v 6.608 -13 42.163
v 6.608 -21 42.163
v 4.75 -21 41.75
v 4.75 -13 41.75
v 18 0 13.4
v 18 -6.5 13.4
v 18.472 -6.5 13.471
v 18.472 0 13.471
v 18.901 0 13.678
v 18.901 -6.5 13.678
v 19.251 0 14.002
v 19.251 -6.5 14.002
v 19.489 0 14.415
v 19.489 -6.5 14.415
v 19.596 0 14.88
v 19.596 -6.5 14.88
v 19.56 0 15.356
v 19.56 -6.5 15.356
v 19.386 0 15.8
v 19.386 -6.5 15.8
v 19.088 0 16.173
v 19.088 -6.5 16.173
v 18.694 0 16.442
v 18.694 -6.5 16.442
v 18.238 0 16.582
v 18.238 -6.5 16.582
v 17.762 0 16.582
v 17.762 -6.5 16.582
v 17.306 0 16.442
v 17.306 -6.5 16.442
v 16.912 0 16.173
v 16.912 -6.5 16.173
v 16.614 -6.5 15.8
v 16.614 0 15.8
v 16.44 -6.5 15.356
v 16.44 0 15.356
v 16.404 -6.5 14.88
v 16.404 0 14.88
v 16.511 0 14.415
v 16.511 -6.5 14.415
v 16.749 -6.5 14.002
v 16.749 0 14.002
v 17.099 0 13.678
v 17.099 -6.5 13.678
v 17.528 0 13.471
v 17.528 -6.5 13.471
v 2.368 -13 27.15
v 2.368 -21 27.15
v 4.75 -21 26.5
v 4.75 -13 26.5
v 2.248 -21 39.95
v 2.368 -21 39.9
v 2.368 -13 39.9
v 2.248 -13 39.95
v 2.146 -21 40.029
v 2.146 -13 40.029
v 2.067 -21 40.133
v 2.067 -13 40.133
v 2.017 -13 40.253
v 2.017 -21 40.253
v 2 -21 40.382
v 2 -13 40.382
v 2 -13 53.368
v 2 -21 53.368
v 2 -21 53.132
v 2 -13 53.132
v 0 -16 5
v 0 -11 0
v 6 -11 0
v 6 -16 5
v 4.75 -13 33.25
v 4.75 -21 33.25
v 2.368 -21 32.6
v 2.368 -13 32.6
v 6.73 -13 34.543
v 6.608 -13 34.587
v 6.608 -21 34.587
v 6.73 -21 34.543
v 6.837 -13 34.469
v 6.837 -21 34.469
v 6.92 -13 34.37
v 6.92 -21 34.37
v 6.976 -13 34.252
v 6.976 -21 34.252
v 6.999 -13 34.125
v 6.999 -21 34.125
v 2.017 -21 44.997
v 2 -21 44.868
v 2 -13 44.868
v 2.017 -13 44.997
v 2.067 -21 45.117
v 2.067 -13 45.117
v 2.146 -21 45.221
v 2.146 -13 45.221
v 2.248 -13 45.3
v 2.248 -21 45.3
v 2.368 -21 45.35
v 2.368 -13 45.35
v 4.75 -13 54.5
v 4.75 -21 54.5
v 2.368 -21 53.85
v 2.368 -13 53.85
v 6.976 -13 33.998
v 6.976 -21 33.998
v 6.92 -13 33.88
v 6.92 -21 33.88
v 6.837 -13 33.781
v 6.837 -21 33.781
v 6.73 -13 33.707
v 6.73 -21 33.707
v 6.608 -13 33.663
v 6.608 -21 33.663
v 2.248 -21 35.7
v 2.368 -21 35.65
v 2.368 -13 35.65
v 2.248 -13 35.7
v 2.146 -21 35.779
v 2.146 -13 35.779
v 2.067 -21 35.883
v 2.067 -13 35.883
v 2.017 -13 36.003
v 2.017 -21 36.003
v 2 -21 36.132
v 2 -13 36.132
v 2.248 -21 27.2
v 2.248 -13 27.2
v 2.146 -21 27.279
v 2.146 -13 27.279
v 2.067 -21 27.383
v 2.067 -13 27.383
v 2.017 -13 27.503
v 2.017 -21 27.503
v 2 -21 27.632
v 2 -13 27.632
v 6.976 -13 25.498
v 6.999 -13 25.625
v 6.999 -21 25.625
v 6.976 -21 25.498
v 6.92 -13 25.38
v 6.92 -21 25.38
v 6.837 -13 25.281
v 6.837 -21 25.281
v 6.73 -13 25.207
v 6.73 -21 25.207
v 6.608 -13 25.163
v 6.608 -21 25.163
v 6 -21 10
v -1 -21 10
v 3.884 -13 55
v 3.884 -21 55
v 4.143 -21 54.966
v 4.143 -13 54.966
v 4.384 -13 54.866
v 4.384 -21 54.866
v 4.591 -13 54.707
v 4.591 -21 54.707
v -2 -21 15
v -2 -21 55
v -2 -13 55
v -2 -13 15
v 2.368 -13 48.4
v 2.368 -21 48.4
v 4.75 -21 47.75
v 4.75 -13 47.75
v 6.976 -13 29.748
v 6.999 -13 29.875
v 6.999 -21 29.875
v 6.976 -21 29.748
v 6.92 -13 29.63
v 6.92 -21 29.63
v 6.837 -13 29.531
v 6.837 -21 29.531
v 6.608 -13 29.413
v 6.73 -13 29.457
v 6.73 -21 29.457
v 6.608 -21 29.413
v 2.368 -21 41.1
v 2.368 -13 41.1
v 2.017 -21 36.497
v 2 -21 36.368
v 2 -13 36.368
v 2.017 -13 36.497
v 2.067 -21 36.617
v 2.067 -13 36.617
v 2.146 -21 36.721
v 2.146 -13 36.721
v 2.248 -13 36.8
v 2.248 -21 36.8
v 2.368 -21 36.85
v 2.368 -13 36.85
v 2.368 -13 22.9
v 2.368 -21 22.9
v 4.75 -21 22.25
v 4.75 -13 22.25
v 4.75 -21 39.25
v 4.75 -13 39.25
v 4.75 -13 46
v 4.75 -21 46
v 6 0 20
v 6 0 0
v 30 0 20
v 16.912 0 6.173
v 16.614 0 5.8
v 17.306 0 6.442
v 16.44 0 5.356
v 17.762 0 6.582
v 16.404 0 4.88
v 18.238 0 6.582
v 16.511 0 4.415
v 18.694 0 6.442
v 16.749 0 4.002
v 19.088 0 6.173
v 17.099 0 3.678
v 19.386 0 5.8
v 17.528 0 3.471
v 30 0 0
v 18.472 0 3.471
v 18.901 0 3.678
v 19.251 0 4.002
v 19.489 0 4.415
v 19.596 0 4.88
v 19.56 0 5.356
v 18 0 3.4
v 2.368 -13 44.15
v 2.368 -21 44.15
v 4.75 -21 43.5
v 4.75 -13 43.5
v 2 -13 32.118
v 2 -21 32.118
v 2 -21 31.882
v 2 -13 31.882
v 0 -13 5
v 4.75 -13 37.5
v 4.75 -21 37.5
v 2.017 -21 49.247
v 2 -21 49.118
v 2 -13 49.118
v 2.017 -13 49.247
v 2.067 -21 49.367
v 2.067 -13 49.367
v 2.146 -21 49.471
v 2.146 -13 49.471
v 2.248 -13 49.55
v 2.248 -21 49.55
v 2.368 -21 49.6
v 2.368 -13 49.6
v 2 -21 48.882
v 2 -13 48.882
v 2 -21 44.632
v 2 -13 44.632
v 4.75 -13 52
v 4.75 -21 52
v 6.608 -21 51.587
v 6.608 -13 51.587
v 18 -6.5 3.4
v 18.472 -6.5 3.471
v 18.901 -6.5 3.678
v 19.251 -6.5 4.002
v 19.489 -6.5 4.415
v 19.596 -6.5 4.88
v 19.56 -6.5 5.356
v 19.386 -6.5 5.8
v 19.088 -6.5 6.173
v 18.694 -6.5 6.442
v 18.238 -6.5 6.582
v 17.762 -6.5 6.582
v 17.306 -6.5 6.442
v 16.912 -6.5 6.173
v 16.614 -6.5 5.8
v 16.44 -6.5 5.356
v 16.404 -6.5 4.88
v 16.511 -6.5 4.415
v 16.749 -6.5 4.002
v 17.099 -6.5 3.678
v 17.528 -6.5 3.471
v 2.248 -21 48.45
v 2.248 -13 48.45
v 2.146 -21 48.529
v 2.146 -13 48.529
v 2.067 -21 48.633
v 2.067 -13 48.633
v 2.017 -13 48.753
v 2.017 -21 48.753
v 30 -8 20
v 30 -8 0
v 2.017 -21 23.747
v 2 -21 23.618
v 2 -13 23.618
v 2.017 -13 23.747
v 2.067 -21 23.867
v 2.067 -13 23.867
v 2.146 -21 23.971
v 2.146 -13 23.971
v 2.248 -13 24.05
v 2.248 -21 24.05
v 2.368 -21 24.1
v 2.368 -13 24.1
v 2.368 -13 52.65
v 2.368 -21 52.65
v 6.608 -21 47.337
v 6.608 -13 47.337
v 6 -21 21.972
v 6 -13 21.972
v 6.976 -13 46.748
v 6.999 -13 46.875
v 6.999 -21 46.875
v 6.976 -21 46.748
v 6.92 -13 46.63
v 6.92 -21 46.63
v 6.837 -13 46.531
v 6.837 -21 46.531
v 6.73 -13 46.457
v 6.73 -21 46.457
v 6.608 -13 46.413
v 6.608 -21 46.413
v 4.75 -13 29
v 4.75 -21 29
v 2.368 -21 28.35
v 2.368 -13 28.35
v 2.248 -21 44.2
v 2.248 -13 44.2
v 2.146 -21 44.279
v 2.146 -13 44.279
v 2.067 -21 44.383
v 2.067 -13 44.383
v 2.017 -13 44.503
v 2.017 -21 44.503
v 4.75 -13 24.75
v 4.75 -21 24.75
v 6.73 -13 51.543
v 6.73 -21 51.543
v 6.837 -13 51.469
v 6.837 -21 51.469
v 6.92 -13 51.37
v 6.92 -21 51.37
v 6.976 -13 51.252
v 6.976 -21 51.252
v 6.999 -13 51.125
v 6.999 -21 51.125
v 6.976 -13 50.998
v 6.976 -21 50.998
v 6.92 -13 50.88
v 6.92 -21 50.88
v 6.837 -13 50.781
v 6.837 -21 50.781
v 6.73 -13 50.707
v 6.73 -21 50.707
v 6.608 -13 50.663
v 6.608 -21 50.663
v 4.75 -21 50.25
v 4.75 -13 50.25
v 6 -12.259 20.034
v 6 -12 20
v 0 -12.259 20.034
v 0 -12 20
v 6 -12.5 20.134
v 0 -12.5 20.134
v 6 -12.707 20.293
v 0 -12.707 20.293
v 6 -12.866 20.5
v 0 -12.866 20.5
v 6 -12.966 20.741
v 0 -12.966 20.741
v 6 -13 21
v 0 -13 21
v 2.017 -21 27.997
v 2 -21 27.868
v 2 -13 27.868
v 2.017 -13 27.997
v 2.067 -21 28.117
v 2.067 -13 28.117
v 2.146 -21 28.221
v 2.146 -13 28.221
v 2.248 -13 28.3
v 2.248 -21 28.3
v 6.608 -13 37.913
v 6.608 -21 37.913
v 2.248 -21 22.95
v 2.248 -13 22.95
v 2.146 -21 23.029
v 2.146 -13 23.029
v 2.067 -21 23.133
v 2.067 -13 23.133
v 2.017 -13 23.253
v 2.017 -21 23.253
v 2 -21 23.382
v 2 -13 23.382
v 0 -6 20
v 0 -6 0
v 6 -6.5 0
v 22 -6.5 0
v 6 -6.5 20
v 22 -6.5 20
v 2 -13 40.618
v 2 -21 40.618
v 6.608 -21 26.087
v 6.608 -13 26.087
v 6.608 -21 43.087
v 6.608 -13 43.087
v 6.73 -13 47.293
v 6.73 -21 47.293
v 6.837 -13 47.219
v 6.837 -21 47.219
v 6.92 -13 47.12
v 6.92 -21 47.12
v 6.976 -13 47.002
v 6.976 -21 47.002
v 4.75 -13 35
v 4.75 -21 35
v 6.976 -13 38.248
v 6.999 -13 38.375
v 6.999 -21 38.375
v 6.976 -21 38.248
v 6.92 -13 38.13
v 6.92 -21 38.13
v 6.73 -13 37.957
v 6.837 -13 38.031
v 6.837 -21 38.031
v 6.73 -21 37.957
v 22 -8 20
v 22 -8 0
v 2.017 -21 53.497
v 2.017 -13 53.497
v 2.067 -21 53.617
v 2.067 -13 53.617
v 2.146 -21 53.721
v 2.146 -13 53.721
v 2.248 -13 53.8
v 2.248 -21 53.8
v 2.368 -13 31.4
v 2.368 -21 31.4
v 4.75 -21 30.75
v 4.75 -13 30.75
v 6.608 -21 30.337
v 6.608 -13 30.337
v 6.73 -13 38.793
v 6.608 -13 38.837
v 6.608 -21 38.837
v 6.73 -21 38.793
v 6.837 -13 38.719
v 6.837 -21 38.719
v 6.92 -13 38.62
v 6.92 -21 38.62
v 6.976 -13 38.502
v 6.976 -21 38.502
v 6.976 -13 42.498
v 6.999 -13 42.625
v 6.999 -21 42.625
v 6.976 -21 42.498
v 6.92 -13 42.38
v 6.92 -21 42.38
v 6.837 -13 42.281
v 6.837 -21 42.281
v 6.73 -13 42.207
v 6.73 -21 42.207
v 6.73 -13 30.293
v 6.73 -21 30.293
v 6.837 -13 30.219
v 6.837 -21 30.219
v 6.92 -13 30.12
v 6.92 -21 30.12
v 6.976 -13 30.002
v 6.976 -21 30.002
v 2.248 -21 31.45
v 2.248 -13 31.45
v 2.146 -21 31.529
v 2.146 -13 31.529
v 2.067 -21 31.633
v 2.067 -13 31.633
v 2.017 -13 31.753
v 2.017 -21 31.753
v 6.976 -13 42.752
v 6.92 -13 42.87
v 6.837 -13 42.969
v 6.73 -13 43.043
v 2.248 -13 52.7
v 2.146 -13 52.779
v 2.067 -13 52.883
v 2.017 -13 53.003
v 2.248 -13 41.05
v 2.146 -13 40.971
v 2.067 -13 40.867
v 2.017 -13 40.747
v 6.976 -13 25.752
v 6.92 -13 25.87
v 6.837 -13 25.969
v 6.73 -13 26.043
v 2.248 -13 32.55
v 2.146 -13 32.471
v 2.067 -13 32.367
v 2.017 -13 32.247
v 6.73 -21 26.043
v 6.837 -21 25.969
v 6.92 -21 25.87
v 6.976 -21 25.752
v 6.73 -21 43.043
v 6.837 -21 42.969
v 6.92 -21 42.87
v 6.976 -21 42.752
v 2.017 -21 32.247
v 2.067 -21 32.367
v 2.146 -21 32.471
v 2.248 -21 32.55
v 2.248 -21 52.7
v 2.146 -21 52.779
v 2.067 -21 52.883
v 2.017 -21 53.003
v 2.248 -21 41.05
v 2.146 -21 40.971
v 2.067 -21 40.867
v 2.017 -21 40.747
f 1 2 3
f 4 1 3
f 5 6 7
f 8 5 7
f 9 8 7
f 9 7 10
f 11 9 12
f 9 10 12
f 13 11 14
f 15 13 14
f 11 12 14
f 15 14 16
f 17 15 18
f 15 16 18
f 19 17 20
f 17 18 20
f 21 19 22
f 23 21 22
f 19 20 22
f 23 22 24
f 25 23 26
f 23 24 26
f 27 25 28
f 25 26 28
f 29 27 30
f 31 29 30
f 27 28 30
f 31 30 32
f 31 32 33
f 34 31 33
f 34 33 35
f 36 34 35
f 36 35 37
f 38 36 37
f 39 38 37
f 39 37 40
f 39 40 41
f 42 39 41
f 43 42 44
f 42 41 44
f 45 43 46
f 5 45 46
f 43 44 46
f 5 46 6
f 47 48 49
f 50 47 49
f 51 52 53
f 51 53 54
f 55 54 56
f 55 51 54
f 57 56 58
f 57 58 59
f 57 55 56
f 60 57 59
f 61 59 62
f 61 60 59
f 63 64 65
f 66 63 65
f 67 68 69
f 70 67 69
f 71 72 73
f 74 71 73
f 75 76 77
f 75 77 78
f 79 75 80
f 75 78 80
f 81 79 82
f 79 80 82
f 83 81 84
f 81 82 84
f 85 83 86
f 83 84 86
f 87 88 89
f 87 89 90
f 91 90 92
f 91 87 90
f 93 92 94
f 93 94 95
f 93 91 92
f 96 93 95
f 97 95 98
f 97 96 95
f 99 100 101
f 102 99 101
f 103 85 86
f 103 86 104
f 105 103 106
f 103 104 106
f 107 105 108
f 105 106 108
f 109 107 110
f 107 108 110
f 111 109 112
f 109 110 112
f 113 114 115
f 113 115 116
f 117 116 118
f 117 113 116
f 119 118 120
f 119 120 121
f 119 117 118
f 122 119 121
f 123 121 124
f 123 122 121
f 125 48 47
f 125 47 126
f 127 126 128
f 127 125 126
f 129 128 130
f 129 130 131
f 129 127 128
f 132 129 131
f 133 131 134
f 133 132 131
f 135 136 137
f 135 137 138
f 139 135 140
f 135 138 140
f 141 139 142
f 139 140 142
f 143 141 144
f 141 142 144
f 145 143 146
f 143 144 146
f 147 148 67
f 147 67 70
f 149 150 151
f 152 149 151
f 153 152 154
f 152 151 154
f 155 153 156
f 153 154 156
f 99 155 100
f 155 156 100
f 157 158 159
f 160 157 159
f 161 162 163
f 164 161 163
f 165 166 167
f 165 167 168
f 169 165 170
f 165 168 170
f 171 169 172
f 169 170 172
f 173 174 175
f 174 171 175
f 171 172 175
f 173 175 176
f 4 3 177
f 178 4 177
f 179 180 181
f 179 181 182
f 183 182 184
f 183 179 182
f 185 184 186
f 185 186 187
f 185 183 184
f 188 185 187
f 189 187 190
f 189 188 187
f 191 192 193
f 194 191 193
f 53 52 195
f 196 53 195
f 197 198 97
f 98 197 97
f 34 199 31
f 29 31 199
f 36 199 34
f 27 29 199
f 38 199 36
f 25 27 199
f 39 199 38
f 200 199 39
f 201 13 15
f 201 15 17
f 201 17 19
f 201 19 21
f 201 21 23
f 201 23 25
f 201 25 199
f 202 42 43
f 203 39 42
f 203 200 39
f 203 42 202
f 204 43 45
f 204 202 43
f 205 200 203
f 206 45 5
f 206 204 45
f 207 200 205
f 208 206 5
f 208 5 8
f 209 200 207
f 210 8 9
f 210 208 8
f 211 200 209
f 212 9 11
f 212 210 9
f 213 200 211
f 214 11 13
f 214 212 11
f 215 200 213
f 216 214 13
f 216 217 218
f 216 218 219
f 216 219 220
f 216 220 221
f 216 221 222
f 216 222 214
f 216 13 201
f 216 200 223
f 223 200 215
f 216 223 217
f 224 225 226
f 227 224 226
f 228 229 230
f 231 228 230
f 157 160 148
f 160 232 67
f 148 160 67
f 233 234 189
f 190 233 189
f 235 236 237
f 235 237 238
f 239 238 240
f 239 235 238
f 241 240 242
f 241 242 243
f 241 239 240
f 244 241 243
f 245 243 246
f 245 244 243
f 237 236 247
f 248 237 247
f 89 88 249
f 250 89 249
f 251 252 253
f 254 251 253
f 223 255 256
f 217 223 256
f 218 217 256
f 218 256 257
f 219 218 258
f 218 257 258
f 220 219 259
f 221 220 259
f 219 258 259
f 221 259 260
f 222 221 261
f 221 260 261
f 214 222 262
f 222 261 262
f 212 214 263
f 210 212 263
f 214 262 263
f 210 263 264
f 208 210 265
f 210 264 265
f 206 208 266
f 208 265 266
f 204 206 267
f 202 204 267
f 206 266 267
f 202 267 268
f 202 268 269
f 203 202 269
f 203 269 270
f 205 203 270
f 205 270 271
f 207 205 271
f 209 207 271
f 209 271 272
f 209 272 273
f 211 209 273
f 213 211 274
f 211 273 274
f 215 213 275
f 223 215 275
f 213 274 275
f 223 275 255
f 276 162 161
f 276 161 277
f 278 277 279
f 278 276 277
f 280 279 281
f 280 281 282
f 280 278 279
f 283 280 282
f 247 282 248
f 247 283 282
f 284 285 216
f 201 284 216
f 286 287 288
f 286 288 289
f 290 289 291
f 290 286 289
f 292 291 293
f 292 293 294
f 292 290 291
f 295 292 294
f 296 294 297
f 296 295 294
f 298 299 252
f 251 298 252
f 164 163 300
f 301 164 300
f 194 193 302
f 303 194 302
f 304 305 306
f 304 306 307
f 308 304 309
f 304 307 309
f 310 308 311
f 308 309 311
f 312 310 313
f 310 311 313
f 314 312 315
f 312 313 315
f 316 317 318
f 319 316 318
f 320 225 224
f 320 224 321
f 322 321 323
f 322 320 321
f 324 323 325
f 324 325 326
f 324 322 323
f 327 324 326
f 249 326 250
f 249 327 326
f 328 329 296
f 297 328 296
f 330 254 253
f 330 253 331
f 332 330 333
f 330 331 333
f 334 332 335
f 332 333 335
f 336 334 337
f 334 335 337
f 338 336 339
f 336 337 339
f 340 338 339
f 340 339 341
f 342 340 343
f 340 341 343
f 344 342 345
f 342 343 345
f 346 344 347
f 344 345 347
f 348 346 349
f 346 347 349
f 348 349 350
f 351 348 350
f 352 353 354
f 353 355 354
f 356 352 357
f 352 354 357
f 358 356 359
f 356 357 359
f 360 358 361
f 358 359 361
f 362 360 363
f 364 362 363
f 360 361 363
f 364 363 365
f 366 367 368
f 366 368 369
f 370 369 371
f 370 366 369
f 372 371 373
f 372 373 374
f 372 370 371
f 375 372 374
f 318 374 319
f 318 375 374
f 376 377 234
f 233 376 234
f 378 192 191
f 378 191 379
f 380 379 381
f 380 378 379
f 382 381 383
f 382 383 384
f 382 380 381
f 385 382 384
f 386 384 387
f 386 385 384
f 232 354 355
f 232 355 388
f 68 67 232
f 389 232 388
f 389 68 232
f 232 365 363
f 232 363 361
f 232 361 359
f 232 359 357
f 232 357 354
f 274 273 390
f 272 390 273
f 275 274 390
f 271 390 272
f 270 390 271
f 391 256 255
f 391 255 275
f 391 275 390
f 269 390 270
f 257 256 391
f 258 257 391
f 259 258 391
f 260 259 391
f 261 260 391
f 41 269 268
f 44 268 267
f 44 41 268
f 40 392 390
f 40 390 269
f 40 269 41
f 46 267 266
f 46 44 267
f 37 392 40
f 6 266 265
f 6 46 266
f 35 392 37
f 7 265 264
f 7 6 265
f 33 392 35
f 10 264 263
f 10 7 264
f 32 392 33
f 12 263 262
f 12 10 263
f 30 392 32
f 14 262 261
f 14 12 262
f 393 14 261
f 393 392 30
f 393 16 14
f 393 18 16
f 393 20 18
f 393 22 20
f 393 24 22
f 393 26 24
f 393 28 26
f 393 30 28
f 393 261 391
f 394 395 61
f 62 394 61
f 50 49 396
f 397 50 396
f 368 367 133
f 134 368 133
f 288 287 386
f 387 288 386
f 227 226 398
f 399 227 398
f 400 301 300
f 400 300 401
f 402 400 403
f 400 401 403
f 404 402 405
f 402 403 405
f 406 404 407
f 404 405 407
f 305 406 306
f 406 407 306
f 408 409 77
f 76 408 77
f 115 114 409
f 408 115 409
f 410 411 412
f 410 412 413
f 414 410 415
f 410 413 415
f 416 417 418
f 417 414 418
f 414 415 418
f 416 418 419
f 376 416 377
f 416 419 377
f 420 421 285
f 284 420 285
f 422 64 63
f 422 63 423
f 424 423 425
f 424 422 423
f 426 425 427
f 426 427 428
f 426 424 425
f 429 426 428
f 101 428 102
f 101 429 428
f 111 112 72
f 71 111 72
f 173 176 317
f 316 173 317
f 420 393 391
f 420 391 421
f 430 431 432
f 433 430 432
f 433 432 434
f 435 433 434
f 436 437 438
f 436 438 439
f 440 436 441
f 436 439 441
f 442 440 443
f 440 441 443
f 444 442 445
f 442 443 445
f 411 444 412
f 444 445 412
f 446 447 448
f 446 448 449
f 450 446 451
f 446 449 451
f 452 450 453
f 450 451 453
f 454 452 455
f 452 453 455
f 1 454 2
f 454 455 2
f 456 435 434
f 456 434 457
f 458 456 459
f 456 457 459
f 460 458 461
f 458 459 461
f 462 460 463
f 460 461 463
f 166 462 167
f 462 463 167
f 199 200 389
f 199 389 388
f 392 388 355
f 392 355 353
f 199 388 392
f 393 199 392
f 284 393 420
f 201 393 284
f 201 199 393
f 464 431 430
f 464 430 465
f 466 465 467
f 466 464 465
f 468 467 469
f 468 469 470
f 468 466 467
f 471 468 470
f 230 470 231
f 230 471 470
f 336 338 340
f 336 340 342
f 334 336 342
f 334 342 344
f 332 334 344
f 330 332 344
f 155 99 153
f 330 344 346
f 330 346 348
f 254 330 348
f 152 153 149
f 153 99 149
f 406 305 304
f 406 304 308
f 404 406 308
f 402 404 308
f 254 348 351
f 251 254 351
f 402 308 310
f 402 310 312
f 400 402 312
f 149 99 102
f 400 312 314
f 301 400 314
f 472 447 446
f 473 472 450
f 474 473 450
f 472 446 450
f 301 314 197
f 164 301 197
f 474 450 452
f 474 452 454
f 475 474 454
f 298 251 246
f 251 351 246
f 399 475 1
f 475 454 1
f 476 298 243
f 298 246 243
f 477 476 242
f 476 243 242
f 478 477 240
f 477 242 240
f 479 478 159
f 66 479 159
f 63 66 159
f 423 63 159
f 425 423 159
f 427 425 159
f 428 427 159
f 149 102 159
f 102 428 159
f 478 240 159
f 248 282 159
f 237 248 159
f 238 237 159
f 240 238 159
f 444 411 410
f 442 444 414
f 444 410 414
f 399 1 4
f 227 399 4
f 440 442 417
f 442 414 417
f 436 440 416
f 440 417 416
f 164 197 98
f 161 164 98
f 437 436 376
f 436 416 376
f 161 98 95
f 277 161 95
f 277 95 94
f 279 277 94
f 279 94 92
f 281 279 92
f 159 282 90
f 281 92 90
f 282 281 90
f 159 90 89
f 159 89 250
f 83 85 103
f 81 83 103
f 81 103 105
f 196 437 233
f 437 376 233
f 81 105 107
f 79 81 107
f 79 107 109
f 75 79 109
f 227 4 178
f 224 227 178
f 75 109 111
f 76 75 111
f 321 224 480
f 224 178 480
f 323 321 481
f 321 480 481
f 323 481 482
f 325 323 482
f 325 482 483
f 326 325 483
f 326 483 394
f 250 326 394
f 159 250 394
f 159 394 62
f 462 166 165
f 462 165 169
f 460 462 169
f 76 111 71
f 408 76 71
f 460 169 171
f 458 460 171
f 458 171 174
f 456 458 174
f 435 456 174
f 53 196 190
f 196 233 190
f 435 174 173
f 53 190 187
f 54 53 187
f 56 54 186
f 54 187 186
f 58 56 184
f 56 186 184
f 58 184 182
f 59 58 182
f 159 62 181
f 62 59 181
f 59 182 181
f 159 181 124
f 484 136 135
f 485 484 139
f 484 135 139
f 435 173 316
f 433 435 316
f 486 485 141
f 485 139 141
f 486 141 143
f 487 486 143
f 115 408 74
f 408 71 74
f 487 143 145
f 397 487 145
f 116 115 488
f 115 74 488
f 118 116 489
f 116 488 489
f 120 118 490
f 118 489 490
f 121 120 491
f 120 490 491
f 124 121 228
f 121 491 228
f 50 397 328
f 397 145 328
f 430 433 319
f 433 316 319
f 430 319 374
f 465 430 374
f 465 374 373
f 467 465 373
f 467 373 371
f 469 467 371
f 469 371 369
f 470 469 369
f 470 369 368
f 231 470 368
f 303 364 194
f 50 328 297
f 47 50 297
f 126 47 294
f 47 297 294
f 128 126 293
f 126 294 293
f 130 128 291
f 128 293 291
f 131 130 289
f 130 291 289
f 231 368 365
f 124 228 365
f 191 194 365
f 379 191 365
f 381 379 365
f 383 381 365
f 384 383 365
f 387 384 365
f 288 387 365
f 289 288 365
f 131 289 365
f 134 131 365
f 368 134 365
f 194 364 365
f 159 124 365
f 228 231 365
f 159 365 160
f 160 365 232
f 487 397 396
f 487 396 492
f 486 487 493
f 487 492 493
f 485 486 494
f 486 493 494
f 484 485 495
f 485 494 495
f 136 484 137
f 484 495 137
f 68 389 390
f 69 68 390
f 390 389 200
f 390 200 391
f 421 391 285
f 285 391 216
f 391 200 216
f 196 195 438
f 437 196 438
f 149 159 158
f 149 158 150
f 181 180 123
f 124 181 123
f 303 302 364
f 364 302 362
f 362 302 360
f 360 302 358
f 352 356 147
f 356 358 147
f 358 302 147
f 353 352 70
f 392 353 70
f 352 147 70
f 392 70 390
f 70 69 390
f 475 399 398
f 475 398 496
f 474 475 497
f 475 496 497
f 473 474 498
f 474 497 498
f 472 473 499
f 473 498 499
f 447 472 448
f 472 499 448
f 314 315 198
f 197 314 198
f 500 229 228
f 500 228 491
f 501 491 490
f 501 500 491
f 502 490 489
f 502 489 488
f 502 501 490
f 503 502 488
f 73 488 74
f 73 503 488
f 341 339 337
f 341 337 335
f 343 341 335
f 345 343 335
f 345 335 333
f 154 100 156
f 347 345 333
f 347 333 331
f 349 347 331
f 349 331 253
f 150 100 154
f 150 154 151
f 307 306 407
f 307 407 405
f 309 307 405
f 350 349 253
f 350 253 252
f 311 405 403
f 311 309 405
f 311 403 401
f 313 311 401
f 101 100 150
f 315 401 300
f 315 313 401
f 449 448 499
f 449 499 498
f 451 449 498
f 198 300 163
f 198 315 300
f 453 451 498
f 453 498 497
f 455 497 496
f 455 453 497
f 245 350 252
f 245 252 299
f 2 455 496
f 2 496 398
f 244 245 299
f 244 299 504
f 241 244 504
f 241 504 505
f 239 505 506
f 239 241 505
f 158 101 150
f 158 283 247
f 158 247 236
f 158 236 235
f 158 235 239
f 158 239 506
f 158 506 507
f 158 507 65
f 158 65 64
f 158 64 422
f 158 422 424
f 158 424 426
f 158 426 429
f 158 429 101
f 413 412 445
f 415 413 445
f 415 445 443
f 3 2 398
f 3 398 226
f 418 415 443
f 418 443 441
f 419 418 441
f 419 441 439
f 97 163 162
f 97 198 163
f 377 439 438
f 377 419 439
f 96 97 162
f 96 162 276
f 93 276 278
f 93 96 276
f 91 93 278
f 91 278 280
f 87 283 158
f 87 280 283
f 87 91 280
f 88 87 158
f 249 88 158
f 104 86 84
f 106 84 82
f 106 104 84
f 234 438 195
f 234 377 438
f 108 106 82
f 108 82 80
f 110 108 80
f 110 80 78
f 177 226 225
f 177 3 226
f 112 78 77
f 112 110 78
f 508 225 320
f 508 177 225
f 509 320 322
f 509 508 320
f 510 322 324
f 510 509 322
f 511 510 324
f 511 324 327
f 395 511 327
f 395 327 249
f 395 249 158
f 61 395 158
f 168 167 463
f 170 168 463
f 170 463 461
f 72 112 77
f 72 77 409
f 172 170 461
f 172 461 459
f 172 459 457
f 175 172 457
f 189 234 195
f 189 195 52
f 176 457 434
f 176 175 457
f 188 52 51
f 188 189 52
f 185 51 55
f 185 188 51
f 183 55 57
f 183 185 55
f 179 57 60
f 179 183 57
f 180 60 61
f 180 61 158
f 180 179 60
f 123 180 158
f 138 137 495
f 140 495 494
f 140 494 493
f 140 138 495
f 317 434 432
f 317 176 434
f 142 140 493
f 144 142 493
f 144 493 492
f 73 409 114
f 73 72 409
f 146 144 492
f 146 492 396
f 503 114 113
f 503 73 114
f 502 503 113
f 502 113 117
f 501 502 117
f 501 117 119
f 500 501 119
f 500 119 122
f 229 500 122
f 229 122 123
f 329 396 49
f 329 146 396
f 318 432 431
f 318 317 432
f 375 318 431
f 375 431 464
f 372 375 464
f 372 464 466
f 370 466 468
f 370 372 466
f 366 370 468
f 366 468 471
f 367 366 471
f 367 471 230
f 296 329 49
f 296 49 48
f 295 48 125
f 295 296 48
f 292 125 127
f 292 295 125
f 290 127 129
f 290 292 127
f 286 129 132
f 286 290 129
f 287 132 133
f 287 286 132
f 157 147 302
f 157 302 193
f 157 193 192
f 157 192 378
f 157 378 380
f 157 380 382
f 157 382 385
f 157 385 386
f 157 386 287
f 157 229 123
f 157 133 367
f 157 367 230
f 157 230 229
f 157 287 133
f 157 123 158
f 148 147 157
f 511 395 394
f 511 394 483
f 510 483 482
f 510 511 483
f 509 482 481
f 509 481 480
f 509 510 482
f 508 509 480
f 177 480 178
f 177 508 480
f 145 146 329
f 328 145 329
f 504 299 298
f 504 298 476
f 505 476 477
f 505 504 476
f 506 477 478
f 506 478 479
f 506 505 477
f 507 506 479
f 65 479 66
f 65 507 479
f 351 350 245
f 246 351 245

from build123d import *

# Parameters (mm, degrees)
SKETCH1_W           = 30
SKETCH1_H           = 16
BOSS_EXTRUDE1_DEPTH = 20
CUT_EXTRUDE1_DEPTH  = 20
SKETCH3_W           = 6
SKETCH3_H           = 10
BOSS_EXTRUDE2_DEPTH = 5
SKETCH9_R           = 1.6
CUT_EXTRUDE3_DEPTH  = 6.5
SKETCH11_W          = 10
SKETCH11_H          = 8
BOSS_EXTRUDE4_DEPTH = 40
CHAMFER2_SIZE2      = 10
CHAMFER2_SIZE       = 2
FILLET1_R           = 1
CUT_EXTRUDE4_DEPTH  = 8
SKETCH13_W          = 2
SKETCH13_H          = 8
BOSS_EXTRUDE5_DEPTH = 10
LPATTERN1_COUNT     = 8
LPATTERN1_PITCH     = 4.25
FILLET2_R           = 0.5
FILLET3_R           = 1
SKETCH14_W          = 2
SKETCH14_H          = 8
CUT_EXTRUDE5_DEPTH  = 17
CHAMFER3_SIZE       = 6
CHAMFER4_SIZE       = 5


# Some blends are built 0.0001 mm under size
with BuildPart() as part:
    # Sketch1 → Boss-Extrude1 (new body)
    with BuildSketch(Plane.XY):
        with Locations((15, -8)):
            Rectangle(SKETCH1_W, SKETCH1_H)
    extrude(amount=BOSS_EXTRUDE1_DEPTH)

    # Sketch2 → Cut-Extrude1 (cut)
    with BuildSketch(Plane.XY.offset(20)):
        Polygon((22, -6.5), (22, -8), (30, -8), (30, -16), (6, -16), (6, -6.5), align=None)
    extrude(amount=-CUT_EXTRUDE1_DEPTH, mode=Mode.SUBTRACT)

    # Sketch3 → Boss-Extrude2 (add)
    with BuildSketch(Plane.XZ.offset(16)):
        with Locations((3, 10)):
            Rectangle(SKETCH3_W, SKETCH3_H)
    extrude(amount=BOSS_EXTRUDE2_DEPTH)

    # Sketch9 → Cut-Extrude3 (cut)
    with BuildSketch(Plane.XZ.offset(6.5)):
        with Locations(Location((18, 15, 0), (0, 0, 270))):
            Circle(SKETCH9_R)
        with Locations(Location((18, 5, 0), (0, 0, 270))):
            Circle(SKETCH9_R)
    extrude(amount=-CUT_EXTRUDE3_DEPTH, mode=Mode.SUBTRACT)

    # Sketch11 → Boss-Extrude4 (add)
    with BuildSketch(Plane.XY.offset(15)):
        with Locations((3, -17)):
            Rectangle(SKETCH11_W, SKETCH11_H)
    extrude(amount=BOSS_EXTRUDE4_DEPTH)

    # Chamfer2
    chamfer2_edges = [part.edges().sort_by_distance(p)[0] for p in [
        (0, -17, 15),
    ]]
    chamfer2_side = [part.faces().sort_by_distance(p)[0] for p in [
        (-0.04, -17, 15),
    ]]
    chamfer(chamfer2_edges, length=CHAMFER2_SIZE - 0.0001, length2=CHAMFER2_SIZE2 - 0.0001, reference=chamfer2_side[0])  # a hair under: the kernel refuses the full size

    # Fillet1
    fillet1_edges = [part.edges().sort_by_distance(p)[0] for p in [
        (3, -13, 20),
    ]]
    fillet(fillet1_edges, radius=FILLET1_R)

    # Sketch12 → Cut-Extrude4 (cut)
    with BuildSketch(Plane.XZ.offset(21)):
        Polygon((7, 55), (4.75, 54.5), (2, 53.75), (2, 52.75), (4.75, 52), (7, 51.5), (7, 50.75), (8, 50.75), (8, 55), align=None)
    cut_extrude4 = extrude(amount=-CUT_EXTRUDE4_DEPTH, mode=Mode.SUBTRACT)

    # Sketch13 → Boss-Extrude5 (add)
    with BuildSketch(Plane(origin=(0, 0, 15), x_dir=(-1, 0, 0), z_dir=(0, 0, -1))):
        with Locations((-7, -17)):
            Rectangle(SKETCH13_W, SKETCH13_H)
    extrude(amount=BOSS_EXTRUDE5_DEPTH)

    # LPattern1: Cut-Extrude4 ×8
    with Locations(*[(0, 0, -i * LPATTERN1_PITCH) for i in range(1, LPATTERN1_COUNT)]):
        add(cut_extrude4, mode=Mode.SUBTRACT)

    # Fillet2
    # the kernel refuses this fillet: 0.5 mm, written as the material it adds along each edge
    with BuildSketch(Plane(origin=(2, -21, 52.75), x_dir=(0.9647638212377322, 0, -0.26311740579210835), z_dir=(0, 1, 0)), Plane(origin=(2, -21, 53.75), x_dir=(0, 0, -1), z_dir=(0, 1, 0)), Plane(origin=(2, -21, 48.5), x_dir=(0.9647638212377321, 0, -0.26311740579210924), z_dir=(0, 1, 0)), Plane(origin=(2, -21, 49.5), x_dir=(0, 0, -1), z_dir=(0, 1, 0)), Plane(origin=(2, -21, 44.25), x_dir=(0.9647638212377321, 0, -0.26311740579210924), z_dir=(0, 1, 0)), Plane(origin=(2, -21, 45.25), x_dir=(0, 0, -1), z_dir=(0, 1, 0)), Plane(origin=(2, -21, 35.75), x_dir=(0.9647638212377321, 0, -0.26311740579210896), z_dir=(0, 1, 0)), Plane(origin=(2, -21, 36.75), x_dir=(0, 0, -1), z_dir=(0, 1, 0)), Plane(origin=(2, -21, 40), x_dir=(0.9647638212377321, 0, -0.26311740579210924), z_dir=(0, 1, 0)), Plane(origin=(2, -21, 41), x_dir=(0, 0, -1), z_dir=(0, 1, 0)), Plane(origin=(2, -21, 23), x_dir=(0.9647638212377319, 0, -0.2631174057921095), z_dir=(0, 1, 0)), Plane(origin=(2, -21, 24), x_dir=(0, 0, -1), z_dir=(0, 1, 0)), Plane(origin=(2, -21, 27.25), x_dir=(0.9647638212377319, 0, -0.2631174057921095), z_dir=(0, 1, 0)), Plane(origin=(2, -21, 28.25), x_dir=(0, 0, -1), z_dir=(0, 1, 0)), Plane(origin=(2, -21, 32.5), x_dir=(0, 0, -1), z_dir=(0, 1, 0)), Plane(origin=(2, -21, 31.5), x_dir=(0.9647638212377319, 0, -0.2631174057921095), z_dir=(0, 1, 0))) as fillet2_piece_1:
        with BuildLine():
            CenterArc((FILLET2_R * 0.763795840999, -FILLET2_R), FILLET2_R, 90, 74.744881297)
            Line((-FILLET2_R * 0.200967980239, -FILLET2_R * 0.736882594208), (0, 0))
            Line((0, 0), (FILLET2_R * 0.763795840999, 0))
        make_face()
    extrude(amount=8)
    # the kernel refuses this fillet: 0.5 mm, written as the material it takes off along each edge
    with BuildSketch(Plane(origin=(7, -22.002714508, 33.75), x_dir=(-0.9761870601839541, 0, -0.21693045781865056), z_dir=(0, 1, 0)), Plane(origin=(7, -22.002714508, 34.5), x_dir=(0, 0, -1), z_dir=(0, 1, 0)), Plane(origin=(7, -22.002714508, 38), x_dir=(-0.9761870601839535, 0, -0.21693045781865242), z_dir=(0, 1, 0)), Plane(origin=(7, -22.002714508, 38.75), x_dir=(0, 0, -1), z_dir=(0, 1, 0)), Plane(origin=(7, -22.002714508, 42.25), x_dir=(-0.9761870601839538, 0, -0.216930457818651), z_dir=(0, 1, 0)), Plane(origin=(7, -22.002714508, 43), x_dir=(0, 0, -1), z_dir=(0, 1, 0)), Plane(origin=(7, -22.002714508, 46.5), x_dir=(-0.9761870601839538, 0, -0.216930457818651), z_dir=(0, 1, 0)), Plane(origin=(7, -22.002714508, 47.25), x_dir=(0, 0, -1), z_dir=(0, 1, 0)), Plane(origin=(7, -22.002714508, 50.75), x_dir=(-0.9761870601839538, 0, -0.216930457818651), z_dir=(0, 1, 0)), Plane(origin=(7, -22.002714508, 51.5), x_dir=(0, 0, -1), z_dir=(0, 1, 0)), Plane(origin=(7, -22.002714508, 25.25), x_dir=(-0.9761870601839521, 0, -0.21693045781865947), z_dir=(0, 1, 0)), Plane(origin=(7, -22.002714508, 26), x_dir=(0, 0, -1), z_dir=(0, 1, 0)), Plane(origin=(7, -22.002714508, 29.5), x_dir=(-0.9761870601839522, 0, -0.2169304578186585), z_dir=(0, 1, 0)), Plane(origin=(7, -22.002714508, 30.25), x_dir=(0, 0, -1), z_dir=(0, 1, 0))) as fillet2_2_piece_1:
        with BuildLine():
            CenterArc((FILLET2_R * 0.802171606366, FILLET2_R), FILLET2_R, 192.528807709, 77.471192291)
            Line((-FILLET2_R * 0.174015453818, FILLET2_R * 0.783069542181), (0, 0))
            Line((0, 0), (FILLET2_R * 0.802171606366, 0))
        make_face()
    extrude(amount=10.005429016, mode=Mode.SUBTRACT)

    # Fillet3
    # the kernel refuses this fillet: 1 mm, written as the material it takes off along each edge
    with BuildSketch(Plane(origin=(7, -28.790063509, 55), x_dir=(-1, 0, 0), z_dir=(0, 1, 0))) as fillet3_piece_1:
        with BuildLine():
            CenterArc((3.116025404, -1), FILLET3_R, 90, 60)
            Line((2.25, -0.5), (0, 0))
            Line((0, 0), (3.116025404, 0))
        make_face()
    extrude(amount=23.580127019, mode=Mode.SUBTRACT)

    # Sketch14 → Cut-Extrude5 (cut)
    with BuildSketch(Plane(origin=(0, 0, 5), x_dir=(-1, 0, 0), z_dir=(0, 0, -1))):
        with Locations((-7, -17)):
            Rectangle(SKETCH14_W, SKETCH14_H)
    extrude(amount=-CUT_EXTRUDE5_DEPTH, mode=Mode.SUBTRACT)

    # Chamfer3
    chamfer3_edges = [part.edges().sort_by_distance(p)[0] for p in [
        (0, 0, 10),
    ]]
    chamfer(chamfer3_edges, length=CHAMFER3_SIZE)

    # Chamfer4
    chamfer4_edges = [part.edges().sort_by_distance(p)[0] for p in [
        (3, -21, 5),
        (3, -16, 0),
    ]]
    chamfer(chamfer4_edges, length=CHAMFER4_SIZE - 0.0001)  # a hair under: the kernel refuses the full size


solid = part.part
